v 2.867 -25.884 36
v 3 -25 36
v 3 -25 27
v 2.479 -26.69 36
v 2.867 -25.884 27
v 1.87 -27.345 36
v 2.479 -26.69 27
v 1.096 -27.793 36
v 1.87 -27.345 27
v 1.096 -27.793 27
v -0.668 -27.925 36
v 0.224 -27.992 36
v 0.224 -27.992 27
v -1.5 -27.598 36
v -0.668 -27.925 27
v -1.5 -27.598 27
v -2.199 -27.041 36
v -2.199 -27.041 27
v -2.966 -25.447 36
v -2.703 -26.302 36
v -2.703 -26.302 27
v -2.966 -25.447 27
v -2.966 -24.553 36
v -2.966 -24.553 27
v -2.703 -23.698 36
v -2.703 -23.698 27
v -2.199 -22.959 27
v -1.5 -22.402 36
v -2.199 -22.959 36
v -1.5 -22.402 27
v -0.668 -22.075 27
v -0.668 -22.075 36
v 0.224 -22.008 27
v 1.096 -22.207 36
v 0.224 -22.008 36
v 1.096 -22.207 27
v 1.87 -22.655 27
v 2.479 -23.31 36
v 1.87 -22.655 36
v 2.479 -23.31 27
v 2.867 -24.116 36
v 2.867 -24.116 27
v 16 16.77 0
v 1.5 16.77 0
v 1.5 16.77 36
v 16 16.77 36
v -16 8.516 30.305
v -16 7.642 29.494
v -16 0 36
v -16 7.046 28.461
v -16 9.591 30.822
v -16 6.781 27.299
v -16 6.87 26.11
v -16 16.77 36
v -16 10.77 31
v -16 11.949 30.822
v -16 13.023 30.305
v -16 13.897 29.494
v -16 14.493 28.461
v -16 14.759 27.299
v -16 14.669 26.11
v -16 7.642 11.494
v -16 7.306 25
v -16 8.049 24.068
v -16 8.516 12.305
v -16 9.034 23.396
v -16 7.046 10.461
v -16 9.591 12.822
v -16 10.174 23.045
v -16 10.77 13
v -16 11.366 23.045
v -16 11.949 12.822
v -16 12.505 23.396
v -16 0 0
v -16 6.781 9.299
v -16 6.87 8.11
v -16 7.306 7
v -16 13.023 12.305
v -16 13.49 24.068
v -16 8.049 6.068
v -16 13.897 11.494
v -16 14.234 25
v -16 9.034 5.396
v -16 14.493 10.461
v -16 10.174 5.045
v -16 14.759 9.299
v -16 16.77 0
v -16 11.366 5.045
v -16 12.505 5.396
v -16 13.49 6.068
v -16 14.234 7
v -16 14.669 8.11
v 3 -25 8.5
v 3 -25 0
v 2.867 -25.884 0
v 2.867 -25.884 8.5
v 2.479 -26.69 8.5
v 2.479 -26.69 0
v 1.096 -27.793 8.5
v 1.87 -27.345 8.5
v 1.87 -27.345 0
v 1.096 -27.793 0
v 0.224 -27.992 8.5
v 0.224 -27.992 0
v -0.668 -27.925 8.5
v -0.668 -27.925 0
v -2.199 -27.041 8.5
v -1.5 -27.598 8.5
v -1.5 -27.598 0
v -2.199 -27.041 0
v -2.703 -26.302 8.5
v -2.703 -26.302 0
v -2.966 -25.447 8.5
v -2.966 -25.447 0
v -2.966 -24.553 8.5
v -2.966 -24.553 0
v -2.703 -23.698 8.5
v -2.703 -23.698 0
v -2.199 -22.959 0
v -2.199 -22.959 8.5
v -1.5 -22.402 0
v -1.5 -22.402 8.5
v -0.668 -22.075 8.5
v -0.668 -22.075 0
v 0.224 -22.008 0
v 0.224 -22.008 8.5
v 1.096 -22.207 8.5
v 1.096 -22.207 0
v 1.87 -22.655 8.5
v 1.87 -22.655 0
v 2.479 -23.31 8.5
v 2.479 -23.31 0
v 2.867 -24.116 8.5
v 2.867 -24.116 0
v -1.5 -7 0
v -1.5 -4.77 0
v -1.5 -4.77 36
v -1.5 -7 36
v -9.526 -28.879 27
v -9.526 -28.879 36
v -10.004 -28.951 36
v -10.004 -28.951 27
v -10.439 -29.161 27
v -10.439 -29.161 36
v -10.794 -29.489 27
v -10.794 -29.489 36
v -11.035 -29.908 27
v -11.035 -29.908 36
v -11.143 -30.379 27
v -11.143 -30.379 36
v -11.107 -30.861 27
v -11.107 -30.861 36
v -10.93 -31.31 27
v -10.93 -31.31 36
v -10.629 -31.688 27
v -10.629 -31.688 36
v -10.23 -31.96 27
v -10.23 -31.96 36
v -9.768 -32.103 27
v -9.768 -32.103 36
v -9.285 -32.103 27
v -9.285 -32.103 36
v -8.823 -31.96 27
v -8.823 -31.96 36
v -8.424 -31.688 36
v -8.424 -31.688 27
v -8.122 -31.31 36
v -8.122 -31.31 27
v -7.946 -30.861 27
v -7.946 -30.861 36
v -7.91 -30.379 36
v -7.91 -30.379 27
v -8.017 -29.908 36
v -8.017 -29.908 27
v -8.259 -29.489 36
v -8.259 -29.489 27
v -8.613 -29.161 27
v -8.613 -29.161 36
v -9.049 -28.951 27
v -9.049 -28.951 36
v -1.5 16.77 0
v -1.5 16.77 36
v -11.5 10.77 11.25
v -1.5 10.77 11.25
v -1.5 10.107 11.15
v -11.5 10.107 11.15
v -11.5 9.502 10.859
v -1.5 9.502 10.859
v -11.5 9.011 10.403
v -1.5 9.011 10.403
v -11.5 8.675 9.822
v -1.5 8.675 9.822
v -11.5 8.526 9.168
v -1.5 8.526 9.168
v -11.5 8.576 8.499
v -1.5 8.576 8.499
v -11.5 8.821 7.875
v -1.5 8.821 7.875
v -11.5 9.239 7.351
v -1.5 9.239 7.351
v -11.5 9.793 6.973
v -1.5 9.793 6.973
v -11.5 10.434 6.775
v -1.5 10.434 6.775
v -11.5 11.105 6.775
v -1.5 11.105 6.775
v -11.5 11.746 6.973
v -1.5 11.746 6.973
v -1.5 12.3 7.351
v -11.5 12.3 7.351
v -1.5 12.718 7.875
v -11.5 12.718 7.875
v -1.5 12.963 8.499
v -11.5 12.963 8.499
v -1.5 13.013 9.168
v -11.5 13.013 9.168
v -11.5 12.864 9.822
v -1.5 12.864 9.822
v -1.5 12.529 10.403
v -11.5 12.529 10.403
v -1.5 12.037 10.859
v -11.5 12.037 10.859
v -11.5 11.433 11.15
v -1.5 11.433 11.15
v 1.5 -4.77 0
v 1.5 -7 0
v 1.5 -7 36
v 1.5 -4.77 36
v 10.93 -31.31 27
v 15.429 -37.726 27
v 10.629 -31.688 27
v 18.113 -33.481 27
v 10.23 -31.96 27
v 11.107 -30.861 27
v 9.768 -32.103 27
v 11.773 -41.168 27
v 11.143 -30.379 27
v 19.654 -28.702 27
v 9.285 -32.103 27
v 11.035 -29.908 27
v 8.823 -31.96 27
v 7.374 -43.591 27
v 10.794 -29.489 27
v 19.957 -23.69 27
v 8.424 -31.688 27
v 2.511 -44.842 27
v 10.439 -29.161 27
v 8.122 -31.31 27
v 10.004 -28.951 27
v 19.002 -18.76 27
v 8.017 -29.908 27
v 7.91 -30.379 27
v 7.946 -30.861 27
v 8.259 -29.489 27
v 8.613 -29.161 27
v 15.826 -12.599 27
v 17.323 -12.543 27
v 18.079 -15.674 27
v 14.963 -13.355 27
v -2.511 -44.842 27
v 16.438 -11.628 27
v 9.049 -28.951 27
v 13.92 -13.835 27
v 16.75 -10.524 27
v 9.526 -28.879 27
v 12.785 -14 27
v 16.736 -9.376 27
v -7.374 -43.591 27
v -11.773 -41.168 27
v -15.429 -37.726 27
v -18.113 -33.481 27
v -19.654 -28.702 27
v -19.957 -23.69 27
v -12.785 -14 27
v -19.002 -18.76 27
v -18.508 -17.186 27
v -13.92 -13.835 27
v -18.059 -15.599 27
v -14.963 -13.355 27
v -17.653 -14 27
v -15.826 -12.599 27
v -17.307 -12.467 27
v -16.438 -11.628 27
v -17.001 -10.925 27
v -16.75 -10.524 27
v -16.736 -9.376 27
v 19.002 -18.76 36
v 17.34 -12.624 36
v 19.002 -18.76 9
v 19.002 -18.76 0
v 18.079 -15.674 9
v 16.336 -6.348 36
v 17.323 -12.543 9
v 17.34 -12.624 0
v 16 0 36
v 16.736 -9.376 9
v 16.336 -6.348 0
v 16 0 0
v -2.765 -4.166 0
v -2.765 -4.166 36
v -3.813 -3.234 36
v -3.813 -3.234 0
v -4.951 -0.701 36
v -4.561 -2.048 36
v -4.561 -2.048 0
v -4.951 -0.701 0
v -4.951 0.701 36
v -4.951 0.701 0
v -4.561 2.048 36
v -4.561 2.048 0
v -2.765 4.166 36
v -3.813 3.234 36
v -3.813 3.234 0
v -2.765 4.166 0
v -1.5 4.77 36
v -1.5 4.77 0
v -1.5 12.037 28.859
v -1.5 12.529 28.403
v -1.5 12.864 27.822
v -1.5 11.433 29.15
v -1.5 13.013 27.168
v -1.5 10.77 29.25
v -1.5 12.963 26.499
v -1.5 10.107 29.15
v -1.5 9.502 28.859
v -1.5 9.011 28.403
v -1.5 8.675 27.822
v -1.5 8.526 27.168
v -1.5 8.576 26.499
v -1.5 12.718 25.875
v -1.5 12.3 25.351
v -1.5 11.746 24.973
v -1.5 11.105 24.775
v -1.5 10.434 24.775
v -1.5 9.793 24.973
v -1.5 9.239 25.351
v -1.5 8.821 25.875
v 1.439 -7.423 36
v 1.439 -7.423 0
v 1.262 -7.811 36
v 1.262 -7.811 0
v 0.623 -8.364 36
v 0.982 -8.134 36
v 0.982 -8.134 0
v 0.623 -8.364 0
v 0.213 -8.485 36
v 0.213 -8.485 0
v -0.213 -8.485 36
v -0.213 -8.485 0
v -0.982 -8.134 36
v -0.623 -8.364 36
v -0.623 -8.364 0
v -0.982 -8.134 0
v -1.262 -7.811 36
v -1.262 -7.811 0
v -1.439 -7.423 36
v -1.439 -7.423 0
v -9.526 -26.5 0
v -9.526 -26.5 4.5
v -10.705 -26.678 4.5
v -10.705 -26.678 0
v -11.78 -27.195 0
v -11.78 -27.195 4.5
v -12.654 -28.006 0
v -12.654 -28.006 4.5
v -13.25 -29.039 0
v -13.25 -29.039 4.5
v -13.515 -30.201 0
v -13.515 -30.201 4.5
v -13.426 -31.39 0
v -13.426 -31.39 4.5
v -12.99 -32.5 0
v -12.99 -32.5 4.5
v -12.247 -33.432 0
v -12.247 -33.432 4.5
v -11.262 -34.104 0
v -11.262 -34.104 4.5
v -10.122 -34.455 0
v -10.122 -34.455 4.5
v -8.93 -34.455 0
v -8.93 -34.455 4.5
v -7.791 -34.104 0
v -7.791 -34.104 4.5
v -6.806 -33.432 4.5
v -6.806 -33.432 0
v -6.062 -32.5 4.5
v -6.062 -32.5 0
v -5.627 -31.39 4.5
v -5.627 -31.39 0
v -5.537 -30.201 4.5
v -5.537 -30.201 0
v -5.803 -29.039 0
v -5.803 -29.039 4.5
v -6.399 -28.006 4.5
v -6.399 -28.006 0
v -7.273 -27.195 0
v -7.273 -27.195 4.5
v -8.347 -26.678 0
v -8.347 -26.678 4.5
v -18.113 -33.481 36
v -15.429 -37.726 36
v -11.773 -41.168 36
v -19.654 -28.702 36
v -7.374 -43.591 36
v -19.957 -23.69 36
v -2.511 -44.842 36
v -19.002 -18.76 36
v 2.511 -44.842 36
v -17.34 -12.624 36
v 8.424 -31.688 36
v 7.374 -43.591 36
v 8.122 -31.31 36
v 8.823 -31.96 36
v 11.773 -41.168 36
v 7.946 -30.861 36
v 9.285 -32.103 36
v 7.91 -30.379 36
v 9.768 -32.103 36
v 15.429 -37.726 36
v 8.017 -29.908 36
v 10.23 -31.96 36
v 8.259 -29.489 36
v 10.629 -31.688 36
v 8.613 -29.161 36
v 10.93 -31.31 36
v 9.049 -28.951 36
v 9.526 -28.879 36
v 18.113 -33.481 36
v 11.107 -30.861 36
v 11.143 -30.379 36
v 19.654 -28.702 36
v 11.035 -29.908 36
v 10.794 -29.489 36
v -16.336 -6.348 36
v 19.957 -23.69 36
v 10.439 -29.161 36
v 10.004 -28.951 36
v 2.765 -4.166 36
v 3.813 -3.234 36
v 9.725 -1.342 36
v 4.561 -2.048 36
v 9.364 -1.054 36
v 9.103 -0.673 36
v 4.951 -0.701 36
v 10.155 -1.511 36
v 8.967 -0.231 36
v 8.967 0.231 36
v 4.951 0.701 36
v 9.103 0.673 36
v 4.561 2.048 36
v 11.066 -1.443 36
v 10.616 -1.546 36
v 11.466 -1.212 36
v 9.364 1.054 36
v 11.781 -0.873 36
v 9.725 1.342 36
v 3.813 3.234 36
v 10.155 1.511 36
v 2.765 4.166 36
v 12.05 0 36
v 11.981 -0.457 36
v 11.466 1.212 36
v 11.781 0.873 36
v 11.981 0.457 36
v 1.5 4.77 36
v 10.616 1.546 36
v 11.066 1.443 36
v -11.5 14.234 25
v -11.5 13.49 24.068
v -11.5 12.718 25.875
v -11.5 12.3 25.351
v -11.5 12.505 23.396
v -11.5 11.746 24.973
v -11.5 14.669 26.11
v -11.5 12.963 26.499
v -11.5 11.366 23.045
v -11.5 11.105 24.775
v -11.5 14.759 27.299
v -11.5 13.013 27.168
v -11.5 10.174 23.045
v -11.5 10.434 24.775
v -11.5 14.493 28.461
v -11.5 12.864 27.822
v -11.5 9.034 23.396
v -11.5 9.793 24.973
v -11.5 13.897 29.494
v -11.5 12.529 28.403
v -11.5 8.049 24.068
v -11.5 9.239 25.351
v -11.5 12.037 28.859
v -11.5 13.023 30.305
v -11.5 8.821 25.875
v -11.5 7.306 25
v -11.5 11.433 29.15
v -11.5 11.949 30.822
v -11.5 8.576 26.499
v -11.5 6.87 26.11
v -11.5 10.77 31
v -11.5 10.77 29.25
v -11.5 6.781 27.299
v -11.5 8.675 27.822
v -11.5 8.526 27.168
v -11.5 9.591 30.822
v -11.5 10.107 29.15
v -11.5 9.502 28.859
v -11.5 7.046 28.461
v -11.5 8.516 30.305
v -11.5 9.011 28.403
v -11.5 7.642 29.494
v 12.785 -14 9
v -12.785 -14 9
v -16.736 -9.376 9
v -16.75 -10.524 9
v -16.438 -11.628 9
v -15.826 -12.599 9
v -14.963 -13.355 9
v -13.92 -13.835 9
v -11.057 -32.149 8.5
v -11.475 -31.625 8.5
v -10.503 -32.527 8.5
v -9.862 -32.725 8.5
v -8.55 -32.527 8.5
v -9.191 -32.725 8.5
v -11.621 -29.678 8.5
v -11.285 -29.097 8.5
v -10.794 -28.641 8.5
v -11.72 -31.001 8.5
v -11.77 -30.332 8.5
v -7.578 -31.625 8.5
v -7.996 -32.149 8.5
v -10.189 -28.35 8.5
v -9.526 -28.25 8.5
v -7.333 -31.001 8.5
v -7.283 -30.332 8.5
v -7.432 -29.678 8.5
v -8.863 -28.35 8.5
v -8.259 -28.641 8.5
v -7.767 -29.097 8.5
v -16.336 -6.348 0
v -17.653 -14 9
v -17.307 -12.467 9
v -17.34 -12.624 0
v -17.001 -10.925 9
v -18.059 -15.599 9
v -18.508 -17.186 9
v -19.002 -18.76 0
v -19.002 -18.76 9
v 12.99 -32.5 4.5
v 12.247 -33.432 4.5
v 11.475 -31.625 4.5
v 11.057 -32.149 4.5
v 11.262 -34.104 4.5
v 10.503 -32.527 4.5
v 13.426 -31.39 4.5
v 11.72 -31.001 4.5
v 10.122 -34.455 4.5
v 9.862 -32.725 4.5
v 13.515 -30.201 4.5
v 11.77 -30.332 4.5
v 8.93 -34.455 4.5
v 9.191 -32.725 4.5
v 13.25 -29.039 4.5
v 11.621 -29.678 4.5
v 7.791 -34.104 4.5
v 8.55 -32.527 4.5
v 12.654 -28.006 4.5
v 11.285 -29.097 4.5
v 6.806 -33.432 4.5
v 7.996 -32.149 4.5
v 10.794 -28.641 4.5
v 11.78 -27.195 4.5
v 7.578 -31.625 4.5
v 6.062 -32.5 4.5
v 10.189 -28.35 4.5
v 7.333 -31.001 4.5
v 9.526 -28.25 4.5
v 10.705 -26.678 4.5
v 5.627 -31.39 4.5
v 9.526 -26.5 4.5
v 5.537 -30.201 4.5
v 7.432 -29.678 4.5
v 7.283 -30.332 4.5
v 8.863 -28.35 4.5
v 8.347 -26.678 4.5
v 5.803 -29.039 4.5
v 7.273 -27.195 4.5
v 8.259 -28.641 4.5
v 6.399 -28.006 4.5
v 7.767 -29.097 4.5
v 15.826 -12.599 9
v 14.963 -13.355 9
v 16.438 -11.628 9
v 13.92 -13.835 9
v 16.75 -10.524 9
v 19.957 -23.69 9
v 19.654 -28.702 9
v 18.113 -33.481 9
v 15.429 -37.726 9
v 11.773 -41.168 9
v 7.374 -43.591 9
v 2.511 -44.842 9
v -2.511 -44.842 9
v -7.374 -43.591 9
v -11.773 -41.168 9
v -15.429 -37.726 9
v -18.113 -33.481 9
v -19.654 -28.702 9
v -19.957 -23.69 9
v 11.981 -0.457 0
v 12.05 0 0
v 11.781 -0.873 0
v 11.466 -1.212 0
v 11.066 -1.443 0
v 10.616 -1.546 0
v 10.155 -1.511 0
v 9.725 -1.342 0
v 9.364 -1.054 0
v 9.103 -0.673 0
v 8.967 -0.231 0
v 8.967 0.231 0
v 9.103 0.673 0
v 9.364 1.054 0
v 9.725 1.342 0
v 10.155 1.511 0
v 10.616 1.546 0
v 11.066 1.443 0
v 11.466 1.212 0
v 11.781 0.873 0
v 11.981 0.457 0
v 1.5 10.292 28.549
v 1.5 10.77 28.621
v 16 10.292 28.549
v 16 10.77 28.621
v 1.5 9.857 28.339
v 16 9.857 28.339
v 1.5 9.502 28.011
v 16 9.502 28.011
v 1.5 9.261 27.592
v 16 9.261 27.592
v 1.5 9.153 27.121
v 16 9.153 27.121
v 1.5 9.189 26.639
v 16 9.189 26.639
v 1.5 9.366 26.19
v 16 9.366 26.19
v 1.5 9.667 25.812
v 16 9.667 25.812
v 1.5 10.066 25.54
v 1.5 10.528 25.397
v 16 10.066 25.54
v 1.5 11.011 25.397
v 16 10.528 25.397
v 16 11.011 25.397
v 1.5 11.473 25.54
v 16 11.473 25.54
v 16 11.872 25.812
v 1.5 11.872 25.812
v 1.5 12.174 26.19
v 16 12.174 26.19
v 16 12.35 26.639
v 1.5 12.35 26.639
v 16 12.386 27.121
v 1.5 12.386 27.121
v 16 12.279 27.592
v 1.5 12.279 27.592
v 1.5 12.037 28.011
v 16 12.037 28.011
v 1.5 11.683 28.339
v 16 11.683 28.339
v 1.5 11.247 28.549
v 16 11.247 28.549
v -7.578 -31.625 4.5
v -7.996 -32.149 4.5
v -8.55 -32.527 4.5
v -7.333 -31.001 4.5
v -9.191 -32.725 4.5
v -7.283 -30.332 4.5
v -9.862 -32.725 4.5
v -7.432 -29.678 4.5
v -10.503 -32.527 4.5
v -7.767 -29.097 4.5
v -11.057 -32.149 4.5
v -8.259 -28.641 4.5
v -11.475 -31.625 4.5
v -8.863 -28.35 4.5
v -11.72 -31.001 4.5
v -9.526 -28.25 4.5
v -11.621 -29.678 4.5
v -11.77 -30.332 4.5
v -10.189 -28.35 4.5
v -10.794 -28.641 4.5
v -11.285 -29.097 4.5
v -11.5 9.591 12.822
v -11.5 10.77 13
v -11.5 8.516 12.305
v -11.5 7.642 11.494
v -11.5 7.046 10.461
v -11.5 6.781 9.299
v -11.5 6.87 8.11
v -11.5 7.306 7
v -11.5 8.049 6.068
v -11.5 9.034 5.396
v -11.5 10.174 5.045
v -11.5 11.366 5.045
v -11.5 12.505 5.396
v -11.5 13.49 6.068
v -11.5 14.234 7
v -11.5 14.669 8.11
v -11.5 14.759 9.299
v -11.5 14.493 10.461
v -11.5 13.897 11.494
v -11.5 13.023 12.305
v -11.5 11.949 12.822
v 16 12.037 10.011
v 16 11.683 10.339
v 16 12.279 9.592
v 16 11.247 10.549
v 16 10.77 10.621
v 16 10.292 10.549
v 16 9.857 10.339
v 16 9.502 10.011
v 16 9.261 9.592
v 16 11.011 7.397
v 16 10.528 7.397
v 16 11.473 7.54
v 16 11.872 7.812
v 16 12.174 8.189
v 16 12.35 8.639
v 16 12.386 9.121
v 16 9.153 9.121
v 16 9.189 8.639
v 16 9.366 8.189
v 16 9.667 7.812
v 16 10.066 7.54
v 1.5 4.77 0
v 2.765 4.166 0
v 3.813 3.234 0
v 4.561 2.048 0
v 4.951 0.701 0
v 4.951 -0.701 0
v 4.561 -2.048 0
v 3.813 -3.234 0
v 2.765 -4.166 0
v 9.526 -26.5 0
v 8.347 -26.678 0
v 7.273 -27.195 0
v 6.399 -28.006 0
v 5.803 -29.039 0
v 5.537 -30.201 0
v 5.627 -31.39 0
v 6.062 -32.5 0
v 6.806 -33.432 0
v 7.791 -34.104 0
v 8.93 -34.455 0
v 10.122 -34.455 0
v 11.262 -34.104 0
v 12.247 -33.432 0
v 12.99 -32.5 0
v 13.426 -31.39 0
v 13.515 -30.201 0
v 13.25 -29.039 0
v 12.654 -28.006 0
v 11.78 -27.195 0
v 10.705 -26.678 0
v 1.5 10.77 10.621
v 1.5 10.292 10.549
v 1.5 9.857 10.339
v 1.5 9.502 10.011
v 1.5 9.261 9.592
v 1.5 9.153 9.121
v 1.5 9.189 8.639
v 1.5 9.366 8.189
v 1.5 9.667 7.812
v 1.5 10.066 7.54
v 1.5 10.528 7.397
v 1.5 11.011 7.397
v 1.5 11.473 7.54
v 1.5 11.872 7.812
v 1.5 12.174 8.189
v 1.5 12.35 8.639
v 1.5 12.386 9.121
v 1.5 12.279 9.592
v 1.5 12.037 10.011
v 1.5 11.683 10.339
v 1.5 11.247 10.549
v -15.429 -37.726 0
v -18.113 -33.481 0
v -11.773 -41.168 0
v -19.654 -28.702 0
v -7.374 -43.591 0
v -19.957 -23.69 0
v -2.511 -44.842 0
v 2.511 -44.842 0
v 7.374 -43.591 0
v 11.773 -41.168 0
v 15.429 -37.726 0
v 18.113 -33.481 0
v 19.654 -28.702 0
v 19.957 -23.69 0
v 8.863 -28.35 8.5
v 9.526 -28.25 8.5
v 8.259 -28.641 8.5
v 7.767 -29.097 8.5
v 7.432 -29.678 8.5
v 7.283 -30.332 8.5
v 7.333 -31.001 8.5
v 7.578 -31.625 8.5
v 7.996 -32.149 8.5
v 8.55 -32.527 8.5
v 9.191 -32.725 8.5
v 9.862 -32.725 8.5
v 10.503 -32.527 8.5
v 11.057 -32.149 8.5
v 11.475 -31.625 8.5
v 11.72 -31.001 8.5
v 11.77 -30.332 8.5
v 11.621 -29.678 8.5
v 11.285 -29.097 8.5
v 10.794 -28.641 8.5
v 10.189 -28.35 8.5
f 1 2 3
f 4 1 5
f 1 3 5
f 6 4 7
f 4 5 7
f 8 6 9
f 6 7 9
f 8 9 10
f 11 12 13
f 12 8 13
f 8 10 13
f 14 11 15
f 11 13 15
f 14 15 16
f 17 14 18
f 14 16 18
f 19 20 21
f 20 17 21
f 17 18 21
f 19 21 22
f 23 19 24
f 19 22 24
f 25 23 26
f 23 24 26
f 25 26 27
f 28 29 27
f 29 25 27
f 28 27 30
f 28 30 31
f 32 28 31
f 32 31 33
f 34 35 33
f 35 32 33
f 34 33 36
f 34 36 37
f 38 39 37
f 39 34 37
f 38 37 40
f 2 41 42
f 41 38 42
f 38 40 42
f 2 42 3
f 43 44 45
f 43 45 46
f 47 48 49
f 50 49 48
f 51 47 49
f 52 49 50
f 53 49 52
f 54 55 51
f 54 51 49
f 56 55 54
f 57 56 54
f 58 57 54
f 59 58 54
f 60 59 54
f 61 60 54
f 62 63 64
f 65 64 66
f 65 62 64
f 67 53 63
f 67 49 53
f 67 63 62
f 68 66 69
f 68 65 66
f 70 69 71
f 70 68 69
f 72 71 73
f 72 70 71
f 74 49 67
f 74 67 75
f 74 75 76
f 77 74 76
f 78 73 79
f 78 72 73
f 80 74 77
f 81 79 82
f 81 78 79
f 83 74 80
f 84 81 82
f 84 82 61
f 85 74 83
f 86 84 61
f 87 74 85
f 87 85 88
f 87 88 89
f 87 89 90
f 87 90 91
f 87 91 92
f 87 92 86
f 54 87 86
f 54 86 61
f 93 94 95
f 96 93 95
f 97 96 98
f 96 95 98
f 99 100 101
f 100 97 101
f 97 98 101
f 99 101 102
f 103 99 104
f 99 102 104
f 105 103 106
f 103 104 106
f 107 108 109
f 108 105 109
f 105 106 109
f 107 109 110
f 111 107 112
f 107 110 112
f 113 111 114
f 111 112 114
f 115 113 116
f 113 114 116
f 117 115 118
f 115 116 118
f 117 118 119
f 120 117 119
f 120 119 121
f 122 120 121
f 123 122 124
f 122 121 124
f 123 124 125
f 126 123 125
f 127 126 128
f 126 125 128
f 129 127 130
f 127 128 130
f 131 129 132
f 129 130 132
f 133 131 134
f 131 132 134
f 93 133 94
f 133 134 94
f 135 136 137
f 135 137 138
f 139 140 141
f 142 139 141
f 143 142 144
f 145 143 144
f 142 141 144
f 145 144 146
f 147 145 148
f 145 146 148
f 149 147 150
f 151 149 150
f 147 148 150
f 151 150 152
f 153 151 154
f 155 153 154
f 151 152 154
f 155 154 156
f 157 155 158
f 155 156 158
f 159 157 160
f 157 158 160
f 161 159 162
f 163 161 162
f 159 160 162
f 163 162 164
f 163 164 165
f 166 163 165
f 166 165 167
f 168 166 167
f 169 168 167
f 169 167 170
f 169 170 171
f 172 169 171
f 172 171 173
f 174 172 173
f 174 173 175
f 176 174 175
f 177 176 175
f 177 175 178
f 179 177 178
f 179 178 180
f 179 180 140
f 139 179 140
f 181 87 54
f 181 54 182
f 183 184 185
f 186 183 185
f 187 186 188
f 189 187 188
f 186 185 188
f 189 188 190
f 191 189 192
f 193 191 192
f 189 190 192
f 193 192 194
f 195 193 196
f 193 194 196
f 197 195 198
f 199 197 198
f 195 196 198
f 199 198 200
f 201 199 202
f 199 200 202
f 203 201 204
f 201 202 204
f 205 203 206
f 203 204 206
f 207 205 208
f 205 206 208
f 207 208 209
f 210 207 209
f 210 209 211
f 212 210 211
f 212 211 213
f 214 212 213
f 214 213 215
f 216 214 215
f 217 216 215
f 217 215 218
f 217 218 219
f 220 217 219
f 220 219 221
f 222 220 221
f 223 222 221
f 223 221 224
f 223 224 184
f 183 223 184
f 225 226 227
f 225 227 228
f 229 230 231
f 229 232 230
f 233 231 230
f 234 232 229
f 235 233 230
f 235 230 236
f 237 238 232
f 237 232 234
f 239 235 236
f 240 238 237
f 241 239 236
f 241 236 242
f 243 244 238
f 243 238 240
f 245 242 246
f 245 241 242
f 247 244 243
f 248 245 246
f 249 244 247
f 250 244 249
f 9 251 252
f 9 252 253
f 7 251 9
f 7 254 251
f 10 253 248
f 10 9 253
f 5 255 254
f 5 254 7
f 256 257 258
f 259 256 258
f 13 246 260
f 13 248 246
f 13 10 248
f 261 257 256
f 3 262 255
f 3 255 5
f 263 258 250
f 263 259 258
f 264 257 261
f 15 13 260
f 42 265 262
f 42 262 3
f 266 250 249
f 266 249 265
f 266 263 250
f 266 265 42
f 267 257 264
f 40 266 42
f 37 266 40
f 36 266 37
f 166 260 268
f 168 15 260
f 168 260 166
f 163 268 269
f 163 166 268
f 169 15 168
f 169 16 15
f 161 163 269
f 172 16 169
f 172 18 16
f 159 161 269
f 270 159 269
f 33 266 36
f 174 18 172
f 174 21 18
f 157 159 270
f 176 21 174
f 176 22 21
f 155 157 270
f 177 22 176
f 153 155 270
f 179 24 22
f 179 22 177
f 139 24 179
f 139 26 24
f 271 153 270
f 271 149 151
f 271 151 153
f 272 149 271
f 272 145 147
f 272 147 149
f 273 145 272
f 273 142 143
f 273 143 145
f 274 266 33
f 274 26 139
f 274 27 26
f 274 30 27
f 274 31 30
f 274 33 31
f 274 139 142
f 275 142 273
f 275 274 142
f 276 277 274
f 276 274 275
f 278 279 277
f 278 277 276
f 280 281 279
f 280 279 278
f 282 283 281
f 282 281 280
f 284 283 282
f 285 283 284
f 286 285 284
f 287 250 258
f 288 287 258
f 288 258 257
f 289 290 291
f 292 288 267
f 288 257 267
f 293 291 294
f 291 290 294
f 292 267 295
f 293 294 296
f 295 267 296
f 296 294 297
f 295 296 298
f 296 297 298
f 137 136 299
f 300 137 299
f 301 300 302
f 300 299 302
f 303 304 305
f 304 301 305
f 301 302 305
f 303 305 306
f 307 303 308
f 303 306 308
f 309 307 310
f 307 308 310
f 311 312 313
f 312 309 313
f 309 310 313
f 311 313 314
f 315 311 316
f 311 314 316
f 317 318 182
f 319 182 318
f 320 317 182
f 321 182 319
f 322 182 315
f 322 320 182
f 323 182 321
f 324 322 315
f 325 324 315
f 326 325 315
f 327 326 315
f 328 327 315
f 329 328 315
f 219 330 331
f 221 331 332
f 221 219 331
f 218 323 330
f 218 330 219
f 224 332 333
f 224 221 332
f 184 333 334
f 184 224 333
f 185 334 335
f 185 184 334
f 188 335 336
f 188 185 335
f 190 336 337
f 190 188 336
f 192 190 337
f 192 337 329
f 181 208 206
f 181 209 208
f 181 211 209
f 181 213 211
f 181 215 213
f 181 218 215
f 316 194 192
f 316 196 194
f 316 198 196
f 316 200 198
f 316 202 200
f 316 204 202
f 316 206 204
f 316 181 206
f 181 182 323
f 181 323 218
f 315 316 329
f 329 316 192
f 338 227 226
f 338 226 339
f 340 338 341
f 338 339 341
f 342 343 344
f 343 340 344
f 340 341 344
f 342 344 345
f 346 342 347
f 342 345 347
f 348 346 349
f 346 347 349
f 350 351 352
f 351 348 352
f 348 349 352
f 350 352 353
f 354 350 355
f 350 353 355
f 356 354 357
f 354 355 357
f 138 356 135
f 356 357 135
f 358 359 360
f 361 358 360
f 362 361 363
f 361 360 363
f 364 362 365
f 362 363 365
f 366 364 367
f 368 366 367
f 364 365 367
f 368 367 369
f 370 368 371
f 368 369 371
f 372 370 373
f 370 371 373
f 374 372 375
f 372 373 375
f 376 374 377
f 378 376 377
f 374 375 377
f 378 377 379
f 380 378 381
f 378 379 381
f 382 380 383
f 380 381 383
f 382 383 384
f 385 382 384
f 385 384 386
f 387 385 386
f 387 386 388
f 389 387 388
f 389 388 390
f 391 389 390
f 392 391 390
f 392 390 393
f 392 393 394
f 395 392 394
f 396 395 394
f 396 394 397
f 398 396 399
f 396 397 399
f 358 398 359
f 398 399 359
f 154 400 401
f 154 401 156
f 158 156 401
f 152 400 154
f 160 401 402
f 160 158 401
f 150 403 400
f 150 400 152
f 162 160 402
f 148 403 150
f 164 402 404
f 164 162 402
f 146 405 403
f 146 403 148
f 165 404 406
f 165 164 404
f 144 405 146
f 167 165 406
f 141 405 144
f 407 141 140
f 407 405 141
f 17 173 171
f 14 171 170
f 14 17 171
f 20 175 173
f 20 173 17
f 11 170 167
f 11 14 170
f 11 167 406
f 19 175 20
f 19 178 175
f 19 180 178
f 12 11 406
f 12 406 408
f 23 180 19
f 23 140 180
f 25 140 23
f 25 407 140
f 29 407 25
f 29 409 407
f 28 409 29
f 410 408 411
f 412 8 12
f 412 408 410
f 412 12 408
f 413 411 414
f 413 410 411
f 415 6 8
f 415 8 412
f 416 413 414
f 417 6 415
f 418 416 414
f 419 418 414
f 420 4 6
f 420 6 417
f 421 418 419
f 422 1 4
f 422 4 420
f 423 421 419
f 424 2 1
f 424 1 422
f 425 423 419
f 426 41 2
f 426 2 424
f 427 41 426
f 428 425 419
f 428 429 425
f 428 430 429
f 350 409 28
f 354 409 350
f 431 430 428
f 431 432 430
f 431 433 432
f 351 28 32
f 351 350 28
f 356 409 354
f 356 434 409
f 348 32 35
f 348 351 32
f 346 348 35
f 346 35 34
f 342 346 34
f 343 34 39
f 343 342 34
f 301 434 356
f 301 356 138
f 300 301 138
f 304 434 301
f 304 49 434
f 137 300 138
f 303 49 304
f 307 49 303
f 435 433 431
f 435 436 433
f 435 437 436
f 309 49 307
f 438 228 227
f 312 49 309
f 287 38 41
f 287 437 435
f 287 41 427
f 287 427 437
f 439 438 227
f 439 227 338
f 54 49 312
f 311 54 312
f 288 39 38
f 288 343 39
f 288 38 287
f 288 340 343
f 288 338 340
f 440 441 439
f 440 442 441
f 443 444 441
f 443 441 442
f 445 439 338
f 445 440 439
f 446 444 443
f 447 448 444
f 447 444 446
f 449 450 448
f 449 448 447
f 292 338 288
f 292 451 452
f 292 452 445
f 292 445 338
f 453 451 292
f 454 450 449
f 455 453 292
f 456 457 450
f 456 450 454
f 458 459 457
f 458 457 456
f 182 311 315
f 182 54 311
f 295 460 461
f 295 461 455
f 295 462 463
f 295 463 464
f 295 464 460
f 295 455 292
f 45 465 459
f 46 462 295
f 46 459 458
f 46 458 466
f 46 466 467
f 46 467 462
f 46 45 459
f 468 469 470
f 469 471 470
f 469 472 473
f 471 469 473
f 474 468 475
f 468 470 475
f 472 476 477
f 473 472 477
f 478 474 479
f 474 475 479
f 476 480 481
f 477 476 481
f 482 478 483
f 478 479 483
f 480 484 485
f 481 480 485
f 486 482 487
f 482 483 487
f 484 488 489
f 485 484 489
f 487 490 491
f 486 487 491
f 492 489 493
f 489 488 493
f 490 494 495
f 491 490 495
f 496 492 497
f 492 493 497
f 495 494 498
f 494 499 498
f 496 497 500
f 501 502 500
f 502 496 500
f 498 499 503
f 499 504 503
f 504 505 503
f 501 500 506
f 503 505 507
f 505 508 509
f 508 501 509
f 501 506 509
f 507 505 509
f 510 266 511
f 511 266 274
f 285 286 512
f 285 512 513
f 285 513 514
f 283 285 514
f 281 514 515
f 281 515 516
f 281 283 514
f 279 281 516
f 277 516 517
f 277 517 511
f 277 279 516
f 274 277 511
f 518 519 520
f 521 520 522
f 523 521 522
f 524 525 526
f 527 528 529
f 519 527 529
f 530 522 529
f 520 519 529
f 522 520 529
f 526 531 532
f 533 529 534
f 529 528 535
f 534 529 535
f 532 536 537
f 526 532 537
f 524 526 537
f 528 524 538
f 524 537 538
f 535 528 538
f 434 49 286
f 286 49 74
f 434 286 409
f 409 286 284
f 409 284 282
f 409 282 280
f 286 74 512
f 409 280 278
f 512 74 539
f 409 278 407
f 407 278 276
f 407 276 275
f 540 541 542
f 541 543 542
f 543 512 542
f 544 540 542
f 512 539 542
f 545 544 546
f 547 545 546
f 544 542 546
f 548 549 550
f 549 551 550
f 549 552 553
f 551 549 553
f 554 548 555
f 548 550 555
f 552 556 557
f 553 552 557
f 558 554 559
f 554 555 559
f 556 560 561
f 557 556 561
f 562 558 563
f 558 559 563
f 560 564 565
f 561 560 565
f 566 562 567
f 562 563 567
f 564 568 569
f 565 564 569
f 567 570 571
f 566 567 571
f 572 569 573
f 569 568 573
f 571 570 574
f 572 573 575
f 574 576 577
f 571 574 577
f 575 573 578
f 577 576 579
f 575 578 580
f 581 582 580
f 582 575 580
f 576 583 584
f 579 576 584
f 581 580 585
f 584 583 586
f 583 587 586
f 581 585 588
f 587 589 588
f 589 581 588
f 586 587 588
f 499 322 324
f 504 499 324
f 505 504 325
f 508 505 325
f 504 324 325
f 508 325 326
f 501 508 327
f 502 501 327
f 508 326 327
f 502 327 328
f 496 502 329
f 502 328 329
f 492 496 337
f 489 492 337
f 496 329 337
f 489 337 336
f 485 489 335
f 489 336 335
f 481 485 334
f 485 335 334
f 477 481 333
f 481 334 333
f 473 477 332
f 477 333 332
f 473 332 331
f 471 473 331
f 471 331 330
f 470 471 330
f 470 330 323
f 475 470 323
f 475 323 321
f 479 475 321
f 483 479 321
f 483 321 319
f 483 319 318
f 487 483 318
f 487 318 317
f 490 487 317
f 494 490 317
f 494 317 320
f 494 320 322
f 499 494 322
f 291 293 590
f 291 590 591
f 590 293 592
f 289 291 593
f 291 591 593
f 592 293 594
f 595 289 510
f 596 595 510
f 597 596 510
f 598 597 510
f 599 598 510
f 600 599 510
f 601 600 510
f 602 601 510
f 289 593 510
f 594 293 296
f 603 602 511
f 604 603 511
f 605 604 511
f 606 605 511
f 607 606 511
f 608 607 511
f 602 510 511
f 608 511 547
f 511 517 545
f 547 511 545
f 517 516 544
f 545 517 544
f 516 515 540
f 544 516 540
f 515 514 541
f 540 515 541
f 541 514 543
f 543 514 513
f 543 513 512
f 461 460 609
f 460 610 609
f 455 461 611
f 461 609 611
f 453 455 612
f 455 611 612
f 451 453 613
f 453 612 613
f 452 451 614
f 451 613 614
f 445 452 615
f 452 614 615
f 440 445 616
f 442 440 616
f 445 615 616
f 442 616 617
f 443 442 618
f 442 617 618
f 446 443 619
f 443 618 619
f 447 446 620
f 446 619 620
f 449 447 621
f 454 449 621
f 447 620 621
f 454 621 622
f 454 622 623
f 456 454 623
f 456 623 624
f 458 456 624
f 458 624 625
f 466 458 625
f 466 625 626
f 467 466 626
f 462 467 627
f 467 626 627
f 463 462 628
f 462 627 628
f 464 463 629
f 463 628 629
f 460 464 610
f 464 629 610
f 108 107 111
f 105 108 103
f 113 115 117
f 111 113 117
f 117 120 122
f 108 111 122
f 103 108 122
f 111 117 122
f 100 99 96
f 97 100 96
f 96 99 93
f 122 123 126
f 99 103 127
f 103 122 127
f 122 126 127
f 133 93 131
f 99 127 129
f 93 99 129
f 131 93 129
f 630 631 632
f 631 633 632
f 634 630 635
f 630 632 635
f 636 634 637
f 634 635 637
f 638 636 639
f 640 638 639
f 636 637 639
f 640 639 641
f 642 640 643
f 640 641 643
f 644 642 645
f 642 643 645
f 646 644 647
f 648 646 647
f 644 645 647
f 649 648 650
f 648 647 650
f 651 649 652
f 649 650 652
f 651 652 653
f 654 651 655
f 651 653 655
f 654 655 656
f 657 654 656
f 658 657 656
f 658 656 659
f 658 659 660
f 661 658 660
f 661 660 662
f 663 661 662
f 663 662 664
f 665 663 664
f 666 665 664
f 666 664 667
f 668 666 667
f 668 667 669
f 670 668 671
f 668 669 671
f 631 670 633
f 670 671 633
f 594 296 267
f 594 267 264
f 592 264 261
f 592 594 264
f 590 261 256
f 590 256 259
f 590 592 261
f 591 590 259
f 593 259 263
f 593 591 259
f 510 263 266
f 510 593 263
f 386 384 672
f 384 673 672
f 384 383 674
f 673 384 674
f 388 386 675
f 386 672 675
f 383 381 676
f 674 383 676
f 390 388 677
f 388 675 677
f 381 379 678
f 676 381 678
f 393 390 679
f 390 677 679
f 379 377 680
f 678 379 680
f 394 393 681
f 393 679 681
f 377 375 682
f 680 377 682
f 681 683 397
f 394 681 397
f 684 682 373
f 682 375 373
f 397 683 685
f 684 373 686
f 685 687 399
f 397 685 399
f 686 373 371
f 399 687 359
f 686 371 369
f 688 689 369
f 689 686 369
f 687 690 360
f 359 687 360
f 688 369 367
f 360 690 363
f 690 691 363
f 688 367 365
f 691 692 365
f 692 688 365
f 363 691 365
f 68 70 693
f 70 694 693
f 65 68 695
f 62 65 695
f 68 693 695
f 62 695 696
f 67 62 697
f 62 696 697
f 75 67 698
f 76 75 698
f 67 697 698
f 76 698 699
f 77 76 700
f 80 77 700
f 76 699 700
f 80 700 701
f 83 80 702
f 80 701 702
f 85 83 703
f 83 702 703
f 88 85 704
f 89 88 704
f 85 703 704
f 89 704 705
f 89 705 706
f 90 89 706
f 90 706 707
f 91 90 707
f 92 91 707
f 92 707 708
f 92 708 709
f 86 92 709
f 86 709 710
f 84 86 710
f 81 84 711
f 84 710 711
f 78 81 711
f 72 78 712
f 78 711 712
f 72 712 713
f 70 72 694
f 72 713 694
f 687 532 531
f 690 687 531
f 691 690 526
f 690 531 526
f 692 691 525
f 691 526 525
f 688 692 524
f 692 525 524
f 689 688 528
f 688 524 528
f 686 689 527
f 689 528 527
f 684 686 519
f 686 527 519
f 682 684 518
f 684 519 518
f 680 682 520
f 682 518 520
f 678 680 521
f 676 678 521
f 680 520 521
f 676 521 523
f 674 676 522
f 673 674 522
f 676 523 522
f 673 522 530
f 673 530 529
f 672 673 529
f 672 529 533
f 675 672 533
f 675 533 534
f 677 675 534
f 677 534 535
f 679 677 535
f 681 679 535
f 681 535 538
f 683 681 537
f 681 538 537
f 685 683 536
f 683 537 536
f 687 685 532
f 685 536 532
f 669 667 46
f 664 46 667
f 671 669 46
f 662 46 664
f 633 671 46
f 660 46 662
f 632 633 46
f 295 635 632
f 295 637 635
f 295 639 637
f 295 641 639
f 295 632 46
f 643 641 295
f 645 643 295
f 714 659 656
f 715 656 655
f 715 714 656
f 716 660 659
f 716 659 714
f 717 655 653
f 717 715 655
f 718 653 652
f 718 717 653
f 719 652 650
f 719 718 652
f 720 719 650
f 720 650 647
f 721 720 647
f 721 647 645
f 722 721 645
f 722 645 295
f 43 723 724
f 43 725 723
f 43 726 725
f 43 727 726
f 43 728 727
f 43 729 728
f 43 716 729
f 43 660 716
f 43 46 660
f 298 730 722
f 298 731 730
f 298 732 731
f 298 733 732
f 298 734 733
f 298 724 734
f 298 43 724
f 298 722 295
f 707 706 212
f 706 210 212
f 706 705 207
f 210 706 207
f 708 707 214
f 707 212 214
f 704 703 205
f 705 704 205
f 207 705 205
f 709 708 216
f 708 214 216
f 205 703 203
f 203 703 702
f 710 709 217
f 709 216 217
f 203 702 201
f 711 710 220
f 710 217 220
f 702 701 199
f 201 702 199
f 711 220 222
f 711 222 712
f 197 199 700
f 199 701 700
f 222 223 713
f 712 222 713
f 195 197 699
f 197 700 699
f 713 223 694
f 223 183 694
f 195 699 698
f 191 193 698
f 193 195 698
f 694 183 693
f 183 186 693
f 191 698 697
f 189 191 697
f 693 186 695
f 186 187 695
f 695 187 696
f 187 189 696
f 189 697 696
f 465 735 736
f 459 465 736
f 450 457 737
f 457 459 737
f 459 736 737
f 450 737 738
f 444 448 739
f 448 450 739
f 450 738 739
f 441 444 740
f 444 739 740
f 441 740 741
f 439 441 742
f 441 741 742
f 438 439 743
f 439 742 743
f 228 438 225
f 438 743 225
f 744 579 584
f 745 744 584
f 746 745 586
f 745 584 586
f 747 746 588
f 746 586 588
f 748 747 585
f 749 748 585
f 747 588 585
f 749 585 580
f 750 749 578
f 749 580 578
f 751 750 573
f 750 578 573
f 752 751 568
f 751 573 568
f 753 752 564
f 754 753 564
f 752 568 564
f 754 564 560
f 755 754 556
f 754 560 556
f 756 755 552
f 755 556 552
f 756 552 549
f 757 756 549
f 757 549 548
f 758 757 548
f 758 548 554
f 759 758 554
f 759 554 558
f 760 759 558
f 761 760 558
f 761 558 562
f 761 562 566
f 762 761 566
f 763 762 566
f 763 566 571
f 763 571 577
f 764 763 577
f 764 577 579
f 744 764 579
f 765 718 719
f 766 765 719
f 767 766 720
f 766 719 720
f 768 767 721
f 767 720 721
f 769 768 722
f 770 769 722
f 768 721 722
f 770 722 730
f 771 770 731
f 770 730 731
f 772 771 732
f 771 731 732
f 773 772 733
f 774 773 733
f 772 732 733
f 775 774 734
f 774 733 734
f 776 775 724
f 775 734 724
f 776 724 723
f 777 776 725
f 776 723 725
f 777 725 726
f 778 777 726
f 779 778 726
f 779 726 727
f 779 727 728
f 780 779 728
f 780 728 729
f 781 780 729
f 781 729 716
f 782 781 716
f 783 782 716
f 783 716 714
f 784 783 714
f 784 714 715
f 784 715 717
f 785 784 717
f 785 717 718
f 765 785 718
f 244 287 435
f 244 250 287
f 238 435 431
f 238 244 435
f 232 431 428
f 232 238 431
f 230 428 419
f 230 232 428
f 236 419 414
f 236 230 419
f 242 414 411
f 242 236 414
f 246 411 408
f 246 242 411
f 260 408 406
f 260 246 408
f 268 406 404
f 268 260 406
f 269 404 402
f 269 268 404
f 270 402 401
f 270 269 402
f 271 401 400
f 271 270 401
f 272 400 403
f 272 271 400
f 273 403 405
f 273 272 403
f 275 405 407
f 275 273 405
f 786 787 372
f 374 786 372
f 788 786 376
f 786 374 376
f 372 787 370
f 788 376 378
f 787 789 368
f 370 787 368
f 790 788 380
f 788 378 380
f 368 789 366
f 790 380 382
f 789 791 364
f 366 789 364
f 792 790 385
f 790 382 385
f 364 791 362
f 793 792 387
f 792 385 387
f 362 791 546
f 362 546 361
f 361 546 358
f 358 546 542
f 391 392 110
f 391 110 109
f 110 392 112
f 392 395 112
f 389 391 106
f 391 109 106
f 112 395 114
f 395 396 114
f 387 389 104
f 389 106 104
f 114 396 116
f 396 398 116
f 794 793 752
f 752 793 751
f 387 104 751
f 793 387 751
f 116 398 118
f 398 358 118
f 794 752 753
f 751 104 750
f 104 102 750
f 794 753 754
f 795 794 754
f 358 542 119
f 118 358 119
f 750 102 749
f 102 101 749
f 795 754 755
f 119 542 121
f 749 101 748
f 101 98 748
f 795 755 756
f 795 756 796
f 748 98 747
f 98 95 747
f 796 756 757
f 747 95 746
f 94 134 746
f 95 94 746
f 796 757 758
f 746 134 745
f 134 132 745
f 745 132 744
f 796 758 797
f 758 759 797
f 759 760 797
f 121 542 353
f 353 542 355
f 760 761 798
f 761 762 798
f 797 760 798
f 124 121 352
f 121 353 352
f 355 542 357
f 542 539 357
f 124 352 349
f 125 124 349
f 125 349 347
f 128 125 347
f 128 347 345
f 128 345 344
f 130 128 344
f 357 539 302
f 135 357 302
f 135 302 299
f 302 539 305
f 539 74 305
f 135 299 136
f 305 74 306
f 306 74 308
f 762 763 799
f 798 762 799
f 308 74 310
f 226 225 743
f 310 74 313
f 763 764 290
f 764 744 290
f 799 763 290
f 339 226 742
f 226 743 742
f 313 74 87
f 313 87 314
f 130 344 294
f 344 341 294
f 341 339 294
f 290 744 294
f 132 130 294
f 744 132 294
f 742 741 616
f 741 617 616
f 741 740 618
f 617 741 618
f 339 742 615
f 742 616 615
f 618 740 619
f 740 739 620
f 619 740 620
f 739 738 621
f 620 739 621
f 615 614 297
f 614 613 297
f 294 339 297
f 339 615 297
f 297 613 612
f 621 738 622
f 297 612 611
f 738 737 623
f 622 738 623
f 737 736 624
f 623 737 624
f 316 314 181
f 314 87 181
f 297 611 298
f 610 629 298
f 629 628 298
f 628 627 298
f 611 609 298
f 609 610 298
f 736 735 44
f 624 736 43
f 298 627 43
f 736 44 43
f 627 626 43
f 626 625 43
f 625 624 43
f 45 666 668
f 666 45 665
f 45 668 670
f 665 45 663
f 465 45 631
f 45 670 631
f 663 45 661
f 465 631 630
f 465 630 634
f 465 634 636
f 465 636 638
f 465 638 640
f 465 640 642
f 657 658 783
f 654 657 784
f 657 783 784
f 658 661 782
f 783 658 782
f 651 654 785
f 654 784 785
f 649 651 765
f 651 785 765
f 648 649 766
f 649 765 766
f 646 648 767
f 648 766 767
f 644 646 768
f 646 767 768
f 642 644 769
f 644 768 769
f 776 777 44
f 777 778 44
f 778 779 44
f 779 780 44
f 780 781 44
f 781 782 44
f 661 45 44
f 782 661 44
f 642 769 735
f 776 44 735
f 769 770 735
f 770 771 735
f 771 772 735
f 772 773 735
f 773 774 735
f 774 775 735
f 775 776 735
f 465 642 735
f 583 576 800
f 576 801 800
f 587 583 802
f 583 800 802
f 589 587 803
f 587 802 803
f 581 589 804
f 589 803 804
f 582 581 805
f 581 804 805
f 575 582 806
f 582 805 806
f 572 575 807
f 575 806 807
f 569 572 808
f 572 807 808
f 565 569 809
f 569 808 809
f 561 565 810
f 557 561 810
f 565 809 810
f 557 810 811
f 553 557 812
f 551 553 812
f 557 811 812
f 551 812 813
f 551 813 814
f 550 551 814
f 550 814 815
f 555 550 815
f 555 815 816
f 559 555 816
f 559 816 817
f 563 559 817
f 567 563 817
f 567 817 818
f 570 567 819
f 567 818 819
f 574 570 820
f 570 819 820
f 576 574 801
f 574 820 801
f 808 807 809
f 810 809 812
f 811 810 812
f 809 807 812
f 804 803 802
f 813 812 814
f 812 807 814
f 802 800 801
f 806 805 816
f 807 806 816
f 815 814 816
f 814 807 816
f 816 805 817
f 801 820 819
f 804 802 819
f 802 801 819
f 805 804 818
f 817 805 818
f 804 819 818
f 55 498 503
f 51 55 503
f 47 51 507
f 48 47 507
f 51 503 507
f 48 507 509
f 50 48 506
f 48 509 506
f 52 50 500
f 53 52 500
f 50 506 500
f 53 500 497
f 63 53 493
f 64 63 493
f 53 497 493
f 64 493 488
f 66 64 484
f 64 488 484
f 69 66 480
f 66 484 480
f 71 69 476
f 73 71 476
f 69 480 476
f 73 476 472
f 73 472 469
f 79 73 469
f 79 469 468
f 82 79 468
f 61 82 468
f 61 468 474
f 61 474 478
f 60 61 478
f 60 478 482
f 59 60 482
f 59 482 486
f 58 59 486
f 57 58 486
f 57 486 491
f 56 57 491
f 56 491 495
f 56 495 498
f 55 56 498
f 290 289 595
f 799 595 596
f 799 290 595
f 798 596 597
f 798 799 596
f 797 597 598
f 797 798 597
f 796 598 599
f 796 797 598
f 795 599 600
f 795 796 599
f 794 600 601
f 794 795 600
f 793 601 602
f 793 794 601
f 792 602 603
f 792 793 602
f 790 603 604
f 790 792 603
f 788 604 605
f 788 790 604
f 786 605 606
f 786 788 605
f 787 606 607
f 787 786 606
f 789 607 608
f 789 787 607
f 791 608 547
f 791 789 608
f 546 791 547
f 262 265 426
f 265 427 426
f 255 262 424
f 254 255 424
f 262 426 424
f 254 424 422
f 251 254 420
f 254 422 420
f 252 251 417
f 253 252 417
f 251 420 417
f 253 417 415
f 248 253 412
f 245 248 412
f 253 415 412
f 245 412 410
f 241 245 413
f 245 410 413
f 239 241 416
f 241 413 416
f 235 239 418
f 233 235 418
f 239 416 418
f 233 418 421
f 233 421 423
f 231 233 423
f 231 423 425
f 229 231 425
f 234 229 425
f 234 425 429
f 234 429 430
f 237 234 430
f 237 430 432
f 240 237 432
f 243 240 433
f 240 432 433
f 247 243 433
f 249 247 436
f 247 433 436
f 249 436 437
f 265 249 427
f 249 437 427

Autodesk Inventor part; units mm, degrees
ref_plane "YZ Plane" through (0, 0, 0) normal (1, 0, 0) x (0, 1, 0)
ref_plane "XZ Plane" through (0, 0, 0) normal (0, 1, 0) x (-1, 0, 0)
ref_plane "XY Plane" through (0, 0, 0) normal (0, 0, 1) x (1, 0, 0)
sketch "Skizze1" plane through (0, 0, 0) normal (0, 0, 1) x (1, 0, 0)
  arc A0 (-1.5, 4.7697) -> (1.5, 4.7697) centre (0, 0) ccw
  arc A1 (-16, 0) -> (16, 0) centre (0, 0) ccw construction
  line L0 (-16, 0) -> (-16, 16.7697)
  line L1 (16, 16.7697) -> (16, 0)
  line L2 (-1.5, 16.7697) -> (-1.5, 4.7697)
  line L3 (1.5, 16.7697) -> (1.5, 4.7697)
  line L4 (-16, 16.7697) -> (-1.5, 16.7697)
  line L5 (1.5, 16.7697) -> (16, 16.7697)
  line L6 (-1.5, 4.7697) -> (1.5, 4.7697) construction
  line L7 (-16, 10.7697) -> (16, 10.7697) construction
  line L8 (-16, 8.7697) -> (16, 8.7697) construction
  line L9 (-16, 12.7697) -> (16, 12.7697) construction
  line L10 (-16, 0) -> (16, 0) construction
  line L11 (16, 0) -> (16, 0)
  line L12 (-16, 0) -> (-16, 0)
  line L13 (-16, 0) -> (16, 0) construction
  line L14 (16, 0) -> (-16, 0) construction
  circle A2 centre (0, -25) radius 20
  line L15 (0, 29.1236) -> (0, -57.3539) construction
  arc A3 (-19.0016, -18.7598) -> (-16, 0) centre (-76.125, 0) ccw
  arc A4 (16, 0) -> (19.0016, -18.7598) centre (76.125, 0) ccw
  circle A5 centre (0, -25) radius 11 construction
  circle A6 centre (0, -14) radius 2.5 construction
  circle A7 centre (0, -25) radius 3
  line L16 (1.5, 0) -> (-1.5, 0)
  line L17 (-1.5, 0) -> (-1.5, -7)
  arc A8 (-1.5, -7) -> (1.5, -7) centre (0, -7) ccw
  line L18 (1.5, -7) -> (1.5, 0)
  circle A9 centre (10.5, 0) radius 1.55
  point P0 (-1.5, 10.7697)
  point P1 (-9.5263, -30.5)
  point P2 (9.5263, -30.5)
  point P3 (12.5, 0)
  point P4 (-12.5, 0)
  point P5 (16, 0)
  point P6 (-16, 0)
  point P7 (0, -5)
  point P8 (0, 0)
  point P9 (1.5, -4.7697)
  point P10 (-1.5, -4.7697)
  point P11 (5, 0)
  dimension "FixationHole_Dia" = 22
  dimension "d0" = 10
  dimension "d1" = 32
  dimension "d2" = 3
  dimension "d3" = 4
  dimension "d4" = 2
  dimension "d5" = 4
  dimension "MotrGC_Part_OuterDia" = 40
  dimension "d8" = 5
  dimension "d12" = 360
  dimension "SmallCapston_Offset" = 25
  dimension "d51" = 6
  dimension "d53" = 7
  dimension "d68" = 11
  dimension "d69" = 5.5
  dimension "d70" = 3.1
extrude "Extrusion1" add sketch "Skizze1" along normal blind 36 contours A0 L17 A2 A3 L0 L4 L2 | L17 A8 L18 A2 | A0 L3 L5 L1 A4 A2 L18 | A9 picked at (-4.3164, -12.8926)
ref_plane "Arbeitsebene1" through (0, 0, 18) normal (0, 0, -1) x (-1, 0, 0)
sketch "Skizze4" plane through (0, 0, 18) normal (0, 0, -1) x (-1, 0, 0)
  arc A0 (-19.0016, -18.7598) -> (19.0016, -18.7598) centre (0, -25) ccw projected
  arc A1 (-19.0016, -18.7598) -> (19.0016, -18.7598) centre (0, -25) ccw projected
  arc A2 (-19.0016, -18.7598) -> (-16, 0) centre (-76.125, 0) ccw projected
  arc A3 (16, 0) -> (19.0016, -18.7598) centre (76.125, 0) ccw projected
  line L0 (-17.6527, -14) -> (17.6527, -14)
  point P0 (0, 0)
  dimension "d77" = 11
extrude "Extrusion2" cut sketch "Skizze4" along normal mid plane 18
hole "Bohrung1" at (-9.5263, -30.5, 0) at (9.5263, -30.5, 0) direction (0, 0, 1) diameter 4.5 depth 9 counterbore diameter 8 counterbore depth 4.5 clearance for "Inbusschraube DIN EN ISO 4762" size "M4" standard "DIN"
sketch "Skizze5" plane through (0, 0, 27) normal (0, 0, -1) x (-1, 0, 0)
  point P0 (0, 0)
  point P1 (-9.5263, -30.5)
  point P2 (9.5263, -30.5)
hole "Bohrung4" at (9.5263, -30.5, 27) at (-9.5263, -30.5, 27) direction (0, 0, 1) diameter 3.242 end through all thread size "M4x0.7" class "6H" standard "ISO Metric profile"
ref_plane "Arbeitsebene2" through (0, 0, 0) normal (-1, 0, 0) x (0, 0, 1)
sketch "Skizze2" plane through (0, 0, 0) normal (-1, 0, 0) x (0, 0, 1)
  line L0 (0, 16.7697) -> (0, 4.7697) construction
  line L1 (0, 4.7697) -> (36, 4.7697) construction
  line L2 (36, 16.7697) -> (36, 4.7697) construction
  line L3 (0, 16.7697) -> (36, 16.7697) construction
  line L4 (0, 10.7697) -> (36, 10.7697) construction
  line L5 (18, 10.7697) -> (18, 16.7697) construction
  point P0 (0, 0)
  point P1 (0, 10.7697)
  point P2 (0, 10.7697)
  point P3 (0, 10.7697)
  point P4 (9, 10.7697)
  point P5 (27, 10.7697)
  dimension "d24" = 18
  dimension "d25" = 9
  dimension "d26" = 9
hole "Bohrung2" at (0, 10.7697, 27) at (0, 10.7697, 9) direction (1, 0, 0) diameter 3.242 end through all thread size "M4x0.7" class "6H" standard "ISO Metric profile"
sketch "Skizze3" plane through (-16, 0, 0) normal (-1, 0, 0) x (0, 0, 1)
  point P0 (0, 0)
  point P1 (9, 10.7697)
  point P2 (27, 10.7697)
hole "Bohrung3" at (-16, 10.7697, 9) at (-16, 10.7697, 27) direction (1, 0, 0) diameter 4.5 depth 14.5 counterbore diameter 8 counterbore depth 4.5 clearance for "Inbusschraube DIN EN ISO 4762" size "M4" standard "DIN"
fillet "Rundung1" radius 4 2 edges at (17.6527, -14, 18) (-17.6527, -14, 18)
extrude "Extrusion4" cut sketch "Skizze1" along normal through all contours A9
sketch "Skizze9" plane through (0, 0, 9) normal (0, 0, 1) x (1, 0, 0)
  circle A0 centre (9.5263, -30.5) radius 2.25 projected
  circle A1 centre (0, -25) radius 3 projected
  circle A2 centre (-9.5263, -30.5) radius 2.25 projected
  point P0 (0, 0)
extrude "Extrusion6" add sketch "Skizze9" against normal blind 0.5
sketch "Skizze6" plane through (16, 0, 0) normal (1, 0, 0) x (0, 0, -1)
  circle A0 centre (-27, 10.7697) radius 1.621 construction
  circle A1 centre (-9, 10.7697) radius 1.621 construction
  line L0 (0, 0) -> (0, 16.7697) construction
  line L1 (0, 16.7697) -> (-36, 16.7697) construction
  line L2 (-36, 0) -> (-36, 16.7697) construction
  line L3 (0, 0) -> (-36, 0) construction
  line L4 (-49, 16.7697) -> (13, 16.7697)
  line L5 (13, 16.7697) -> (13, 0)
  line L6 (13, 0) -> (-49, 0)
  line L7 (-49, 0) -> (-49, 16.7697)
  point P0 (0, 0)
  point P1 (-18, 16.7697)
  point P2 (-18, 0)
  dimension "d54" = 62
sketch "Skizze7" plane through (26, 0, 0) normal (1, 0, 0) x (0, 0, -1)
  line L0 (-49, 50) -> (-49, -17) construction
  line L1 (-36, 50) -> (-36, -17) construction
  line L2 (0, 50) -> (0, -17) construction
  line L3 (13, 50) -> (13, -17) construction
  line L4 (-49, 16.7697) -> (-49, 0) construction
  line L5 (-49, 8.3848) -> (13, 8.3848) construction
  line L6 (13, 0) -> (13, 16.7697) projected
  point P0 (0, 0)
  point P1 (-42.5, 8.3848)
  point P2 (6.5, 8.3848)
  dimension "d58" = 13
  dimension "d59" = 6.5
  dimension "d60" = 6.5
equation "\"d4\" = 0.5 * d3"
equation "\"d69\" = 0.5 * d68"
equation "\"d25\" = 0.5 * d24"
equation "\"d26\" = 0.5 * d24"
equation "\"d59\" = 0.5 * d58"
equation "\"d60\" = d59"
properties part number "ParallelMech_DrivenPart_Motor_GC_ShaftConnector" material "PBT-Kunststoff"
